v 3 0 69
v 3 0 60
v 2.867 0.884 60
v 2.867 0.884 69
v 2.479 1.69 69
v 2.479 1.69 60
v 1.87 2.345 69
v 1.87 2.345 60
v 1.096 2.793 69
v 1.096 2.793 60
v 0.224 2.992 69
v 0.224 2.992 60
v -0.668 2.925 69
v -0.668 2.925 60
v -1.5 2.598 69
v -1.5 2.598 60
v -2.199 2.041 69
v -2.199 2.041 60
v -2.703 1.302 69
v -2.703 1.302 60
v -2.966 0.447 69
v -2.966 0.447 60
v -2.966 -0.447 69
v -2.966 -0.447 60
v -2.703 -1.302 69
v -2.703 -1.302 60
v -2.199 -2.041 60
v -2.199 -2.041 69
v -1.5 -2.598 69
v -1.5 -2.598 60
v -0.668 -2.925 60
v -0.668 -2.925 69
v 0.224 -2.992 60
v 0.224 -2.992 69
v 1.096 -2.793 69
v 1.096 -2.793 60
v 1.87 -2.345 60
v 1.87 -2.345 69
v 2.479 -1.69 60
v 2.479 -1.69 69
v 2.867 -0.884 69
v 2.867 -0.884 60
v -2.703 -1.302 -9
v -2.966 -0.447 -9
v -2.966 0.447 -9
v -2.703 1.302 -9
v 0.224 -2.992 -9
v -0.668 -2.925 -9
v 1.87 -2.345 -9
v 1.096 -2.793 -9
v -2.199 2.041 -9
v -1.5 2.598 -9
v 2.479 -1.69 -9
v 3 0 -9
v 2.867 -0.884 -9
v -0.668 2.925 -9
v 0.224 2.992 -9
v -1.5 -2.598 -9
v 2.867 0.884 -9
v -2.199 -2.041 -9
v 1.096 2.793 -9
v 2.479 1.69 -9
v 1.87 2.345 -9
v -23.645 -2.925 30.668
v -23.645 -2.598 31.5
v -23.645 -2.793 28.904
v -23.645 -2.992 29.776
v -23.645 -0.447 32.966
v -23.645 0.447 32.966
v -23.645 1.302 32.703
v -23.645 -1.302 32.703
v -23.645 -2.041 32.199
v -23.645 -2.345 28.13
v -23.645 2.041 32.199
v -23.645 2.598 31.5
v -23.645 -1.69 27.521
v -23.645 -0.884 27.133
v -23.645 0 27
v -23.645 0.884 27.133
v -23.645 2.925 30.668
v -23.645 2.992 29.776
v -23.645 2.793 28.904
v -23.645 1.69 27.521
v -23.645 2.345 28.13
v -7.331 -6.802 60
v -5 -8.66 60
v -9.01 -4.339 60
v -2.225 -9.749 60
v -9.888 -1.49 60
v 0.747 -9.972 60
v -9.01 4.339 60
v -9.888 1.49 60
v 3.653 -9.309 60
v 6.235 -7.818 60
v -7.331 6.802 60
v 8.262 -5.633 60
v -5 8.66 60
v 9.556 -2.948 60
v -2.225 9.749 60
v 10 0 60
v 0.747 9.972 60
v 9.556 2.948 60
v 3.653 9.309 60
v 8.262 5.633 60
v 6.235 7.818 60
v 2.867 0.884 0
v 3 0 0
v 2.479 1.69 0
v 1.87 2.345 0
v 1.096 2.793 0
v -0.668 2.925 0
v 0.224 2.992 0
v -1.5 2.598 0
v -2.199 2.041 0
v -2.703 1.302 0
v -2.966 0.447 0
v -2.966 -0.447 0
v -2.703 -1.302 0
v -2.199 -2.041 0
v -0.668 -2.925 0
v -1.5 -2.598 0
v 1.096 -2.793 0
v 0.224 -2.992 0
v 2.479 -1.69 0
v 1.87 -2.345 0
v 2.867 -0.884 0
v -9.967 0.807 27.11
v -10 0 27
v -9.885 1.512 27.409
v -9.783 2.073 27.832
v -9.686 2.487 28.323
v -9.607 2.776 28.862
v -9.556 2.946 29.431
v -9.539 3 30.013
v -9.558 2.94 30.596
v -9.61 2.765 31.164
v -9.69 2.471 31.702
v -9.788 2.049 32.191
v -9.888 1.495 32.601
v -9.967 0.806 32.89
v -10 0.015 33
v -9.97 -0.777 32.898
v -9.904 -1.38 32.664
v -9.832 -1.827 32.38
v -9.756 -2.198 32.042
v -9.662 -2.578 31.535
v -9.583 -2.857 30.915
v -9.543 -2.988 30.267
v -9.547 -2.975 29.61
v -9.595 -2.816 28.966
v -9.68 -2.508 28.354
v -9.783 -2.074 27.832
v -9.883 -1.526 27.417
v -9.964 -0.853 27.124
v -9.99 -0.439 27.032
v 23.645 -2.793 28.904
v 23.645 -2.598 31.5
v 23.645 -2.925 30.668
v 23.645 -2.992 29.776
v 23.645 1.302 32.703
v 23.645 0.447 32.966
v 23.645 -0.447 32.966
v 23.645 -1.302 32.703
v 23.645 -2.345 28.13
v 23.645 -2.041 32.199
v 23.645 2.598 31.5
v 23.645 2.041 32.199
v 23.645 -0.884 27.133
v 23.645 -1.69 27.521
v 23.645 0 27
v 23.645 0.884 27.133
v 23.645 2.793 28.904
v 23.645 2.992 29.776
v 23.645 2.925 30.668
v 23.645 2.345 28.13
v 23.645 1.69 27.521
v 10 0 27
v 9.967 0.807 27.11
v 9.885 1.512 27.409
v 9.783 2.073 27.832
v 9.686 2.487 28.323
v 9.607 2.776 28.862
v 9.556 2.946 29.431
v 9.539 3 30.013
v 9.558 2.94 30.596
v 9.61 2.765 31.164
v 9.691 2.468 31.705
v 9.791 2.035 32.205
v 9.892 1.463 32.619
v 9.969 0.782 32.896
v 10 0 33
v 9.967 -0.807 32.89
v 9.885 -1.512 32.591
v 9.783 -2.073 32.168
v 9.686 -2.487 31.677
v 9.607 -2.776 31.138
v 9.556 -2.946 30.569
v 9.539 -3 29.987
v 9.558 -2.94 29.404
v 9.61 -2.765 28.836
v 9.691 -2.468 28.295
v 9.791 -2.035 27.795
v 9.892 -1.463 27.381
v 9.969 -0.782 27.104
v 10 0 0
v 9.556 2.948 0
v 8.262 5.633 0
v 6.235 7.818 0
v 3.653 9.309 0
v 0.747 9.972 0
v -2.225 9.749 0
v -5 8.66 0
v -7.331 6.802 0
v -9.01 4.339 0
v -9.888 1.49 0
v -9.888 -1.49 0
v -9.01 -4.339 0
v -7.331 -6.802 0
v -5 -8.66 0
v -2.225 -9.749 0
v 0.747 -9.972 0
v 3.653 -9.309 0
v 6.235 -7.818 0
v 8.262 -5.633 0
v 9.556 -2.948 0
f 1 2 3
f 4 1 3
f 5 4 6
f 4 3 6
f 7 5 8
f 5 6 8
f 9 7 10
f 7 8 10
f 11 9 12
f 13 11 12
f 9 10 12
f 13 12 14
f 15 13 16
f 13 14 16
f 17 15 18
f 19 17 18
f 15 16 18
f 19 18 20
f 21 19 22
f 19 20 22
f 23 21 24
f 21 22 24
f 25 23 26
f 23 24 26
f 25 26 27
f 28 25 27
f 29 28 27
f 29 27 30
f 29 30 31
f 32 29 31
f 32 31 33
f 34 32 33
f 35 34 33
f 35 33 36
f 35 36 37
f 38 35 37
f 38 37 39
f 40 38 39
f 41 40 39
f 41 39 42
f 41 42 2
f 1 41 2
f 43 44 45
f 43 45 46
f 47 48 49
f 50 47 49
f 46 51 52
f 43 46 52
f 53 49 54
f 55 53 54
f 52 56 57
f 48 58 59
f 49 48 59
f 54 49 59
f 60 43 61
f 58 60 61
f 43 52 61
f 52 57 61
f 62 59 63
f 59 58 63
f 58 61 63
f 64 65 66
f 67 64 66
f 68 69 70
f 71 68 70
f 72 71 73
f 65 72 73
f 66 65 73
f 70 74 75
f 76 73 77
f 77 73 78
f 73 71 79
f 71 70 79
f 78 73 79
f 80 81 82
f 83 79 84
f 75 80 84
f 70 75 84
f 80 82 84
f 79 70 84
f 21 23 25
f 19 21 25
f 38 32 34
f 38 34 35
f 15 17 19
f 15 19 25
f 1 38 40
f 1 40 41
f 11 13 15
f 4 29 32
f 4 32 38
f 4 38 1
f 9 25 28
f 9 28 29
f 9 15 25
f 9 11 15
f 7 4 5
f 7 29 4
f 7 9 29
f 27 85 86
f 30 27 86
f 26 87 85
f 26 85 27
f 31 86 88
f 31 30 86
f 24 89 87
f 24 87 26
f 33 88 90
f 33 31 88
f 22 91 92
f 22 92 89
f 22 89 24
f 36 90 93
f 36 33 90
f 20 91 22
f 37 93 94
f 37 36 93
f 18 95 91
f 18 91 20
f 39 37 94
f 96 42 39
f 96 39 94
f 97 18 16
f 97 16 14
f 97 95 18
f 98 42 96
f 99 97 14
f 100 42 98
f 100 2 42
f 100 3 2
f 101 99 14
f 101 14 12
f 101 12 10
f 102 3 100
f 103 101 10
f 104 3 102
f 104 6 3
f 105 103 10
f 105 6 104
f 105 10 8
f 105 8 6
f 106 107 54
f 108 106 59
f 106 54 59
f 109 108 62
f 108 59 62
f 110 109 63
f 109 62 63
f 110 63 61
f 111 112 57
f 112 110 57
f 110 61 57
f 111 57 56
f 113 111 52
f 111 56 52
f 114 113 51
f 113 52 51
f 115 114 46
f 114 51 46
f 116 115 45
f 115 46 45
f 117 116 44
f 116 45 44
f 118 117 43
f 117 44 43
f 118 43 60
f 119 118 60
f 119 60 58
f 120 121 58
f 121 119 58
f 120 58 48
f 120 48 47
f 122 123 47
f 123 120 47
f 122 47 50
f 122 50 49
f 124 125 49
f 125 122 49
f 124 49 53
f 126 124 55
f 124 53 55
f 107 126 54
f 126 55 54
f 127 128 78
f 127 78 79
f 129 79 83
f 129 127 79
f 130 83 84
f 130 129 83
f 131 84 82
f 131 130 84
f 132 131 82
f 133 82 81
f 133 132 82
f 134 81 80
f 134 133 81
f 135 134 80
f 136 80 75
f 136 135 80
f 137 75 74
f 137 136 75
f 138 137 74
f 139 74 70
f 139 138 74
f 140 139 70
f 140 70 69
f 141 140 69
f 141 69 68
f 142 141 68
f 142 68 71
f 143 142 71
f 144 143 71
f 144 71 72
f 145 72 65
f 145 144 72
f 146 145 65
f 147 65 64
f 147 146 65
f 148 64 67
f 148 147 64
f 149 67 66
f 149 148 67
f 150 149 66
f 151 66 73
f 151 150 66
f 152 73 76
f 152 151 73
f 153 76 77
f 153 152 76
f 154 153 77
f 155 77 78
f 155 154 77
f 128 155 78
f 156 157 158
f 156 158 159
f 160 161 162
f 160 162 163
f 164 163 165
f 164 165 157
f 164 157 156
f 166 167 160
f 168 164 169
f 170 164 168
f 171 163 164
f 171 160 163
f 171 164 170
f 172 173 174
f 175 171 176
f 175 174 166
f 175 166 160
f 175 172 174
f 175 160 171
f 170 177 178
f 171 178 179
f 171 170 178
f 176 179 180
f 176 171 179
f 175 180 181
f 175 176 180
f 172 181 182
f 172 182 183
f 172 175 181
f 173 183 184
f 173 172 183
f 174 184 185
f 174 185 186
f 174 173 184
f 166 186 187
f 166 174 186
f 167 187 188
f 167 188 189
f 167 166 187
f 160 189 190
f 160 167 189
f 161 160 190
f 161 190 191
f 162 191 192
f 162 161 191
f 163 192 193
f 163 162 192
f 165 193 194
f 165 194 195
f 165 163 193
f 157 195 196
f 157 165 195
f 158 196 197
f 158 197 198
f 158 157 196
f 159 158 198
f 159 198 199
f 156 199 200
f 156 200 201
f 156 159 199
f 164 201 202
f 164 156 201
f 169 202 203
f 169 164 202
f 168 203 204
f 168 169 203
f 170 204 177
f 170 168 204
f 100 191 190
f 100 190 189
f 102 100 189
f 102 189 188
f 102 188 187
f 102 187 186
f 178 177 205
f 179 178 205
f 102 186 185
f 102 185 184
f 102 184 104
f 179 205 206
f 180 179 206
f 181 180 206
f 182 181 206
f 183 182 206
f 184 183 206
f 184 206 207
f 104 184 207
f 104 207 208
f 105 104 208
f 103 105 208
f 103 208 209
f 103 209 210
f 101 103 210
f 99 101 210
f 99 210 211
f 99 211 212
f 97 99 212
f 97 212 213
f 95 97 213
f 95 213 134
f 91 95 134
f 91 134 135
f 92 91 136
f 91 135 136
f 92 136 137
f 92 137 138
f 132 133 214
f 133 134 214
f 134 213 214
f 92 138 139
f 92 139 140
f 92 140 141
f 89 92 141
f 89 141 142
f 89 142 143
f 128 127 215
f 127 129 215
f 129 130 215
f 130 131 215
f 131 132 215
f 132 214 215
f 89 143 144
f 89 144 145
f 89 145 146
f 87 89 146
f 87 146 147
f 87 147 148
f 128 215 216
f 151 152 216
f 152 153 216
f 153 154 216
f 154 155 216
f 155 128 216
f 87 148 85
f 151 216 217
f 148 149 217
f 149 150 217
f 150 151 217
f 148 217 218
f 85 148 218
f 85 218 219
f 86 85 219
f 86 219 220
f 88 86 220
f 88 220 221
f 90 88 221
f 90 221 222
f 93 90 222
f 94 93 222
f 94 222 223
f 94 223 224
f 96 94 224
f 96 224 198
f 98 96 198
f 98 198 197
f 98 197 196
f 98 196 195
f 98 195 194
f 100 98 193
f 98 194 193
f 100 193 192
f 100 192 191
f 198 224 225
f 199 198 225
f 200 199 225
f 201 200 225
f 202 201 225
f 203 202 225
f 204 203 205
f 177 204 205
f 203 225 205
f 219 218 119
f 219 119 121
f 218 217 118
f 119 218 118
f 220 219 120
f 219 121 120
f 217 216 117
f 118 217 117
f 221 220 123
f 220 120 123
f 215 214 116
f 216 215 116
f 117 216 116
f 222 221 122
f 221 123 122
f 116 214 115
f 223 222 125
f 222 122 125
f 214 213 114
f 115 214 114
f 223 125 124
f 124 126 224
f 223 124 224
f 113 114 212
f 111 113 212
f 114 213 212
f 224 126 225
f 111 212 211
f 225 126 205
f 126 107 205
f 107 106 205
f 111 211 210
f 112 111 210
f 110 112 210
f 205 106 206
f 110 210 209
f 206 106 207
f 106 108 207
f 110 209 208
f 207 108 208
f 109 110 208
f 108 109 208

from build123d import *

# Parameters (mm, degrees)
SKETCH1_R                = 10
BOSS_EXTRUDE1_DEPTH      = 60
SKETCH2_R                = 3
BOSS_EXTRUDE2_DEPTH      = 23.645
BOSS_EXTRUDE3_DEPTH      = 9
BOSS_EXTRUDE3_DEPTH_BACK = 69
SKETCH3_R                = 3


with BuildPart() as part:
    # Sketch1 → Boss-Extrude1 (new body)
    with BuildSketch(Plane.XY):
        Circle(SKETCH1_R)
    extrude(amount=BOSS_EXTRUDE1_DEPTH)

    # Sketch2 → Boss-Extrude2 (add, symmetric)
    with BuildSketch(Plane(origin=(0, 0, 0), x_dir=(0, 0, -1), z_dir=(1, 0, 0))):
        with Locations((-30, 0)):
            Circle(SKETCH2_R)
    extrude(amount=BOSS_EXTRUDE2_DEPTH, both=True)

    # Sketch3 → Boss-Extrude3 (add, two sides: drawn at the far end of the back side and taken through both)
    with BuildSketch(Plane.XY.offset(60).offset(-BOSS_EXTRUDE3_DEPTH_BACK)):
        Circle(SKETCH3_R)
    extrude(amount=BOSS_EXTRUDE3_DEPTH + BOSS_EXTRUDE3_DEPTH_BACK)


solid = part.part
